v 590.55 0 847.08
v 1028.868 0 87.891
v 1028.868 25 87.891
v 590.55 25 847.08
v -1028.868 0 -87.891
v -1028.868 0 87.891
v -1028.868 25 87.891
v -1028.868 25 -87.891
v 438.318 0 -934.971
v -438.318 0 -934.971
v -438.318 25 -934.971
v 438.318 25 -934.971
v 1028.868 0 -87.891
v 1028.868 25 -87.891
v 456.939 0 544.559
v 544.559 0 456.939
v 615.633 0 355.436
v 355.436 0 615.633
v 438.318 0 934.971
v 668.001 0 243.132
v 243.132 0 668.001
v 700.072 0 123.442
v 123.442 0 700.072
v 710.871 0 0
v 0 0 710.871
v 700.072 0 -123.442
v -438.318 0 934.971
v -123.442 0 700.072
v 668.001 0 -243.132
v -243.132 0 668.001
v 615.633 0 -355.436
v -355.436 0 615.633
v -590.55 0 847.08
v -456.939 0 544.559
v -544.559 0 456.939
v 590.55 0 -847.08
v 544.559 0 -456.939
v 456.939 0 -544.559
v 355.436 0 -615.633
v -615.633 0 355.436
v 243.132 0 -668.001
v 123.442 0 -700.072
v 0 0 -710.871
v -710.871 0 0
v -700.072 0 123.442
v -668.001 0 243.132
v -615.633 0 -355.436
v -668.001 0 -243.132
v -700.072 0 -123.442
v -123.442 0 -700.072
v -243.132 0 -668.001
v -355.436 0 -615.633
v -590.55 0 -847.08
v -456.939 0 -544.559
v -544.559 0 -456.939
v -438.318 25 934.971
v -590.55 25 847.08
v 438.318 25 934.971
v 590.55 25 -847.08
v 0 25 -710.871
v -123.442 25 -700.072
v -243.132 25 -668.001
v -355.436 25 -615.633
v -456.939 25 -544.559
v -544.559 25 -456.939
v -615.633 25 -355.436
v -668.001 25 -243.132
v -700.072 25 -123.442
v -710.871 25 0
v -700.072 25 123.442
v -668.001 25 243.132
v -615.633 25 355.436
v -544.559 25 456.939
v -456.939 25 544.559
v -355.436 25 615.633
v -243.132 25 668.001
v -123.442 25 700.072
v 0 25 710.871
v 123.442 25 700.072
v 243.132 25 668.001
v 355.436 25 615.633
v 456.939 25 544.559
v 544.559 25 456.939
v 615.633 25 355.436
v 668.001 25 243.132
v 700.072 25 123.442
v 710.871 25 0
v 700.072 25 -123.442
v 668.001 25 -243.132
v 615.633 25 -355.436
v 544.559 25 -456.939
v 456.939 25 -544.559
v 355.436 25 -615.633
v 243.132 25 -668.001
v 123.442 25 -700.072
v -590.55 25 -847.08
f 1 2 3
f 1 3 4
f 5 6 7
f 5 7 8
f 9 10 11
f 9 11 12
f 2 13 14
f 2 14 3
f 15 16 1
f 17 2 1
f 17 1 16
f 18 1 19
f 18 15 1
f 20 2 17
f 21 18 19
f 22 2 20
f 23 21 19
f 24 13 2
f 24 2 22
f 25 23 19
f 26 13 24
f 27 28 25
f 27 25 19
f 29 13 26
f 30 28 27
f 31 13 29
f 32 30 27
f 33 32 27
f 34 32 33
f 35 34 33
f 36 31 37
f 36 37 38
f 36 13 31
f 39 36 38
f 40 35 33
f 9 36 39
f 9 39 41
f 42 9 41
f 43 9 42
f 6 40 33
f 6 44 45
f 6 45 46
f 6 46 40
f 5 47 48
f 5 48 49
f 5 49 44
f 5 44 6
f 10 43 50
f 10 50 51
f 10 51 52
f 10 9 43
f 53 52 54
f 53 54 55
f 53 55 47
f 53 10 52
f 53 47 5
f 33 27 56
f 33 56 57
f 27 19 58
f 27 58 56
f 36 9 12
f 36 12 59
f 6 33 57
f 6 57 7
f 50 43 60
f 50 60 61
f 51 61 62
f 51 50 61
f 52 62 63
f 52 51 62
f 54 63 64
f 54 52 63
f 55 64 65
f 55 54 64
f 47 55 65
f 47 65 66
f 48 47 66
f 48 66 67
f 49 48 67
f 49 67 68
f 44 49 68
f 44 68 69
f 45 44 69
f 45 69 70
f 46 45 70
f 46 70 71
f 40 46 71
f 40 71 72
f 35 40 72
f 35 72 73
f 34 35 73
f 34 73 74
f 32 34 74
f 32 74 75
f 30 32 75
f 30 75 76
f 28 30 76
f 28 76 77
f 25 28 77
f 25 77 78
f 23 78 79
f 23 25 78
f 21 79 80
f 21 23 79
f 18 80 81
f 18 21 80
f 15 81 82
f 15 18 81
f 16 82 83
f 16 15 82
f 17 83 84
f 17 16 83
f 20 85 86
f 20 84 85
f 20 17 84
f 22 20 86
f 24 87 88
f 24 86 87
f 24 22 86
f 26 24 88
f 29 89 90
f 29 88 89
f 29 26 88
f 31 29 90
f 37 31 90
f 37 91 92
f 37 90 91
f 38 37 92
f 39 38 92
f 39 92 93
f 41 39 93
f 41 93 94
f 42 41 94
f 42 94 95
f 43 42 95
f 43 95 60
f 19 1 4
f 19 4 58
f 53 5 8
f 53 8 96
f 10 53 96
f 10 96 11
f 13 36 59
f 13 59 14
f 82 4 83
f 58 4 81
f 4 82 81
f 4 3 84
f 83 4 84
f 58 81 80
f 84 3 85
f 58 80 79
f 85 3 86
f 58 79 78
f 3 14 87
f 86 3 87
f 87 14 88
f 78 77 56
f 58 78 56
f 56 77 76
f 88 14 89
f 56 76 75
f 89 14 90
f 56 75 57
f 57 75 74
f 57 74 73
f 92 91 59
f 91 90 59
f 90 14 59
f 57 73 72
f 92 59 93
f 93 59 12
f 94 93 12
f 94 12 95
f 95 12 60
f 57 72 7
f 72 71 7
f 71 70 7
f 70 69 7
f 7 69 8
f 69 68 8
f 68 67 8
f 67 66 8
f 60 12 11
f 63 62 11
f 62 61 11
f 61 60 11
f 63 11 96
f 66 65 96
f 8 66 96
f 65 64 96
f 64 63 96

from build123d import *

# Parameters (mm, degrees)
BOSS_EXTRUDE1_DEPTH = 25
CUT_EXTRUDE4_REACH  = 1392.455
SKETCH2_R           = 710.8712965


with BuildPart() as part:
    # Sketch1 → Boss-Extrude1 (new body)
    with BuildSketch(Plane(origin=(0, 0, 0), x_dir=(1, 0, 0), z_dir=(0, 1, 0))):
        Polygon((438.317943801, 934.970880832), (590.549562699, 847.079914683), (1028.8675065, 87.89096615), (1028.8675065, -87.89096615), (590.549562699, -847.079914683), (438.317943801, -934.970880832), (-438.317943801, -934.970880832), (-590.549562699, -847.079914683), (-1028.8675065, -87.89096615), (-1028.8675065, 87.89096615), (-590.549562699, 847.079914683), (-438.317943801, 934.970880832), align=None)
    extrude(amount=BOSS_EXTRUDE1_DEPTH)

    # Sketch2 → Cut-Extrude4 (cut, up to next)
    with BuildSketch(Plane(origin=(0, 0, 0), x_dir=(1, 0, 0), z_dir=(0, 1, 0)), mode=Mode.PRIVATE) as cut_extrude4_sk1:
        with Locations(Location((0, 0, 0), (0, 0, 90))):
            Circle(SKETCH2_R)
    cut_extrude4_tool1 = extrude(cut_extrude4_sk1.sketch, amount=CUT_EXTRUDE4_REACH, mode=Mode.PRIVATE) & part.part
    add(cut_extrude4_tool1.solids().sort_by_distance((0, 0, 0))[0], mode=Mode.SUBTRACT)


solid = part.part
